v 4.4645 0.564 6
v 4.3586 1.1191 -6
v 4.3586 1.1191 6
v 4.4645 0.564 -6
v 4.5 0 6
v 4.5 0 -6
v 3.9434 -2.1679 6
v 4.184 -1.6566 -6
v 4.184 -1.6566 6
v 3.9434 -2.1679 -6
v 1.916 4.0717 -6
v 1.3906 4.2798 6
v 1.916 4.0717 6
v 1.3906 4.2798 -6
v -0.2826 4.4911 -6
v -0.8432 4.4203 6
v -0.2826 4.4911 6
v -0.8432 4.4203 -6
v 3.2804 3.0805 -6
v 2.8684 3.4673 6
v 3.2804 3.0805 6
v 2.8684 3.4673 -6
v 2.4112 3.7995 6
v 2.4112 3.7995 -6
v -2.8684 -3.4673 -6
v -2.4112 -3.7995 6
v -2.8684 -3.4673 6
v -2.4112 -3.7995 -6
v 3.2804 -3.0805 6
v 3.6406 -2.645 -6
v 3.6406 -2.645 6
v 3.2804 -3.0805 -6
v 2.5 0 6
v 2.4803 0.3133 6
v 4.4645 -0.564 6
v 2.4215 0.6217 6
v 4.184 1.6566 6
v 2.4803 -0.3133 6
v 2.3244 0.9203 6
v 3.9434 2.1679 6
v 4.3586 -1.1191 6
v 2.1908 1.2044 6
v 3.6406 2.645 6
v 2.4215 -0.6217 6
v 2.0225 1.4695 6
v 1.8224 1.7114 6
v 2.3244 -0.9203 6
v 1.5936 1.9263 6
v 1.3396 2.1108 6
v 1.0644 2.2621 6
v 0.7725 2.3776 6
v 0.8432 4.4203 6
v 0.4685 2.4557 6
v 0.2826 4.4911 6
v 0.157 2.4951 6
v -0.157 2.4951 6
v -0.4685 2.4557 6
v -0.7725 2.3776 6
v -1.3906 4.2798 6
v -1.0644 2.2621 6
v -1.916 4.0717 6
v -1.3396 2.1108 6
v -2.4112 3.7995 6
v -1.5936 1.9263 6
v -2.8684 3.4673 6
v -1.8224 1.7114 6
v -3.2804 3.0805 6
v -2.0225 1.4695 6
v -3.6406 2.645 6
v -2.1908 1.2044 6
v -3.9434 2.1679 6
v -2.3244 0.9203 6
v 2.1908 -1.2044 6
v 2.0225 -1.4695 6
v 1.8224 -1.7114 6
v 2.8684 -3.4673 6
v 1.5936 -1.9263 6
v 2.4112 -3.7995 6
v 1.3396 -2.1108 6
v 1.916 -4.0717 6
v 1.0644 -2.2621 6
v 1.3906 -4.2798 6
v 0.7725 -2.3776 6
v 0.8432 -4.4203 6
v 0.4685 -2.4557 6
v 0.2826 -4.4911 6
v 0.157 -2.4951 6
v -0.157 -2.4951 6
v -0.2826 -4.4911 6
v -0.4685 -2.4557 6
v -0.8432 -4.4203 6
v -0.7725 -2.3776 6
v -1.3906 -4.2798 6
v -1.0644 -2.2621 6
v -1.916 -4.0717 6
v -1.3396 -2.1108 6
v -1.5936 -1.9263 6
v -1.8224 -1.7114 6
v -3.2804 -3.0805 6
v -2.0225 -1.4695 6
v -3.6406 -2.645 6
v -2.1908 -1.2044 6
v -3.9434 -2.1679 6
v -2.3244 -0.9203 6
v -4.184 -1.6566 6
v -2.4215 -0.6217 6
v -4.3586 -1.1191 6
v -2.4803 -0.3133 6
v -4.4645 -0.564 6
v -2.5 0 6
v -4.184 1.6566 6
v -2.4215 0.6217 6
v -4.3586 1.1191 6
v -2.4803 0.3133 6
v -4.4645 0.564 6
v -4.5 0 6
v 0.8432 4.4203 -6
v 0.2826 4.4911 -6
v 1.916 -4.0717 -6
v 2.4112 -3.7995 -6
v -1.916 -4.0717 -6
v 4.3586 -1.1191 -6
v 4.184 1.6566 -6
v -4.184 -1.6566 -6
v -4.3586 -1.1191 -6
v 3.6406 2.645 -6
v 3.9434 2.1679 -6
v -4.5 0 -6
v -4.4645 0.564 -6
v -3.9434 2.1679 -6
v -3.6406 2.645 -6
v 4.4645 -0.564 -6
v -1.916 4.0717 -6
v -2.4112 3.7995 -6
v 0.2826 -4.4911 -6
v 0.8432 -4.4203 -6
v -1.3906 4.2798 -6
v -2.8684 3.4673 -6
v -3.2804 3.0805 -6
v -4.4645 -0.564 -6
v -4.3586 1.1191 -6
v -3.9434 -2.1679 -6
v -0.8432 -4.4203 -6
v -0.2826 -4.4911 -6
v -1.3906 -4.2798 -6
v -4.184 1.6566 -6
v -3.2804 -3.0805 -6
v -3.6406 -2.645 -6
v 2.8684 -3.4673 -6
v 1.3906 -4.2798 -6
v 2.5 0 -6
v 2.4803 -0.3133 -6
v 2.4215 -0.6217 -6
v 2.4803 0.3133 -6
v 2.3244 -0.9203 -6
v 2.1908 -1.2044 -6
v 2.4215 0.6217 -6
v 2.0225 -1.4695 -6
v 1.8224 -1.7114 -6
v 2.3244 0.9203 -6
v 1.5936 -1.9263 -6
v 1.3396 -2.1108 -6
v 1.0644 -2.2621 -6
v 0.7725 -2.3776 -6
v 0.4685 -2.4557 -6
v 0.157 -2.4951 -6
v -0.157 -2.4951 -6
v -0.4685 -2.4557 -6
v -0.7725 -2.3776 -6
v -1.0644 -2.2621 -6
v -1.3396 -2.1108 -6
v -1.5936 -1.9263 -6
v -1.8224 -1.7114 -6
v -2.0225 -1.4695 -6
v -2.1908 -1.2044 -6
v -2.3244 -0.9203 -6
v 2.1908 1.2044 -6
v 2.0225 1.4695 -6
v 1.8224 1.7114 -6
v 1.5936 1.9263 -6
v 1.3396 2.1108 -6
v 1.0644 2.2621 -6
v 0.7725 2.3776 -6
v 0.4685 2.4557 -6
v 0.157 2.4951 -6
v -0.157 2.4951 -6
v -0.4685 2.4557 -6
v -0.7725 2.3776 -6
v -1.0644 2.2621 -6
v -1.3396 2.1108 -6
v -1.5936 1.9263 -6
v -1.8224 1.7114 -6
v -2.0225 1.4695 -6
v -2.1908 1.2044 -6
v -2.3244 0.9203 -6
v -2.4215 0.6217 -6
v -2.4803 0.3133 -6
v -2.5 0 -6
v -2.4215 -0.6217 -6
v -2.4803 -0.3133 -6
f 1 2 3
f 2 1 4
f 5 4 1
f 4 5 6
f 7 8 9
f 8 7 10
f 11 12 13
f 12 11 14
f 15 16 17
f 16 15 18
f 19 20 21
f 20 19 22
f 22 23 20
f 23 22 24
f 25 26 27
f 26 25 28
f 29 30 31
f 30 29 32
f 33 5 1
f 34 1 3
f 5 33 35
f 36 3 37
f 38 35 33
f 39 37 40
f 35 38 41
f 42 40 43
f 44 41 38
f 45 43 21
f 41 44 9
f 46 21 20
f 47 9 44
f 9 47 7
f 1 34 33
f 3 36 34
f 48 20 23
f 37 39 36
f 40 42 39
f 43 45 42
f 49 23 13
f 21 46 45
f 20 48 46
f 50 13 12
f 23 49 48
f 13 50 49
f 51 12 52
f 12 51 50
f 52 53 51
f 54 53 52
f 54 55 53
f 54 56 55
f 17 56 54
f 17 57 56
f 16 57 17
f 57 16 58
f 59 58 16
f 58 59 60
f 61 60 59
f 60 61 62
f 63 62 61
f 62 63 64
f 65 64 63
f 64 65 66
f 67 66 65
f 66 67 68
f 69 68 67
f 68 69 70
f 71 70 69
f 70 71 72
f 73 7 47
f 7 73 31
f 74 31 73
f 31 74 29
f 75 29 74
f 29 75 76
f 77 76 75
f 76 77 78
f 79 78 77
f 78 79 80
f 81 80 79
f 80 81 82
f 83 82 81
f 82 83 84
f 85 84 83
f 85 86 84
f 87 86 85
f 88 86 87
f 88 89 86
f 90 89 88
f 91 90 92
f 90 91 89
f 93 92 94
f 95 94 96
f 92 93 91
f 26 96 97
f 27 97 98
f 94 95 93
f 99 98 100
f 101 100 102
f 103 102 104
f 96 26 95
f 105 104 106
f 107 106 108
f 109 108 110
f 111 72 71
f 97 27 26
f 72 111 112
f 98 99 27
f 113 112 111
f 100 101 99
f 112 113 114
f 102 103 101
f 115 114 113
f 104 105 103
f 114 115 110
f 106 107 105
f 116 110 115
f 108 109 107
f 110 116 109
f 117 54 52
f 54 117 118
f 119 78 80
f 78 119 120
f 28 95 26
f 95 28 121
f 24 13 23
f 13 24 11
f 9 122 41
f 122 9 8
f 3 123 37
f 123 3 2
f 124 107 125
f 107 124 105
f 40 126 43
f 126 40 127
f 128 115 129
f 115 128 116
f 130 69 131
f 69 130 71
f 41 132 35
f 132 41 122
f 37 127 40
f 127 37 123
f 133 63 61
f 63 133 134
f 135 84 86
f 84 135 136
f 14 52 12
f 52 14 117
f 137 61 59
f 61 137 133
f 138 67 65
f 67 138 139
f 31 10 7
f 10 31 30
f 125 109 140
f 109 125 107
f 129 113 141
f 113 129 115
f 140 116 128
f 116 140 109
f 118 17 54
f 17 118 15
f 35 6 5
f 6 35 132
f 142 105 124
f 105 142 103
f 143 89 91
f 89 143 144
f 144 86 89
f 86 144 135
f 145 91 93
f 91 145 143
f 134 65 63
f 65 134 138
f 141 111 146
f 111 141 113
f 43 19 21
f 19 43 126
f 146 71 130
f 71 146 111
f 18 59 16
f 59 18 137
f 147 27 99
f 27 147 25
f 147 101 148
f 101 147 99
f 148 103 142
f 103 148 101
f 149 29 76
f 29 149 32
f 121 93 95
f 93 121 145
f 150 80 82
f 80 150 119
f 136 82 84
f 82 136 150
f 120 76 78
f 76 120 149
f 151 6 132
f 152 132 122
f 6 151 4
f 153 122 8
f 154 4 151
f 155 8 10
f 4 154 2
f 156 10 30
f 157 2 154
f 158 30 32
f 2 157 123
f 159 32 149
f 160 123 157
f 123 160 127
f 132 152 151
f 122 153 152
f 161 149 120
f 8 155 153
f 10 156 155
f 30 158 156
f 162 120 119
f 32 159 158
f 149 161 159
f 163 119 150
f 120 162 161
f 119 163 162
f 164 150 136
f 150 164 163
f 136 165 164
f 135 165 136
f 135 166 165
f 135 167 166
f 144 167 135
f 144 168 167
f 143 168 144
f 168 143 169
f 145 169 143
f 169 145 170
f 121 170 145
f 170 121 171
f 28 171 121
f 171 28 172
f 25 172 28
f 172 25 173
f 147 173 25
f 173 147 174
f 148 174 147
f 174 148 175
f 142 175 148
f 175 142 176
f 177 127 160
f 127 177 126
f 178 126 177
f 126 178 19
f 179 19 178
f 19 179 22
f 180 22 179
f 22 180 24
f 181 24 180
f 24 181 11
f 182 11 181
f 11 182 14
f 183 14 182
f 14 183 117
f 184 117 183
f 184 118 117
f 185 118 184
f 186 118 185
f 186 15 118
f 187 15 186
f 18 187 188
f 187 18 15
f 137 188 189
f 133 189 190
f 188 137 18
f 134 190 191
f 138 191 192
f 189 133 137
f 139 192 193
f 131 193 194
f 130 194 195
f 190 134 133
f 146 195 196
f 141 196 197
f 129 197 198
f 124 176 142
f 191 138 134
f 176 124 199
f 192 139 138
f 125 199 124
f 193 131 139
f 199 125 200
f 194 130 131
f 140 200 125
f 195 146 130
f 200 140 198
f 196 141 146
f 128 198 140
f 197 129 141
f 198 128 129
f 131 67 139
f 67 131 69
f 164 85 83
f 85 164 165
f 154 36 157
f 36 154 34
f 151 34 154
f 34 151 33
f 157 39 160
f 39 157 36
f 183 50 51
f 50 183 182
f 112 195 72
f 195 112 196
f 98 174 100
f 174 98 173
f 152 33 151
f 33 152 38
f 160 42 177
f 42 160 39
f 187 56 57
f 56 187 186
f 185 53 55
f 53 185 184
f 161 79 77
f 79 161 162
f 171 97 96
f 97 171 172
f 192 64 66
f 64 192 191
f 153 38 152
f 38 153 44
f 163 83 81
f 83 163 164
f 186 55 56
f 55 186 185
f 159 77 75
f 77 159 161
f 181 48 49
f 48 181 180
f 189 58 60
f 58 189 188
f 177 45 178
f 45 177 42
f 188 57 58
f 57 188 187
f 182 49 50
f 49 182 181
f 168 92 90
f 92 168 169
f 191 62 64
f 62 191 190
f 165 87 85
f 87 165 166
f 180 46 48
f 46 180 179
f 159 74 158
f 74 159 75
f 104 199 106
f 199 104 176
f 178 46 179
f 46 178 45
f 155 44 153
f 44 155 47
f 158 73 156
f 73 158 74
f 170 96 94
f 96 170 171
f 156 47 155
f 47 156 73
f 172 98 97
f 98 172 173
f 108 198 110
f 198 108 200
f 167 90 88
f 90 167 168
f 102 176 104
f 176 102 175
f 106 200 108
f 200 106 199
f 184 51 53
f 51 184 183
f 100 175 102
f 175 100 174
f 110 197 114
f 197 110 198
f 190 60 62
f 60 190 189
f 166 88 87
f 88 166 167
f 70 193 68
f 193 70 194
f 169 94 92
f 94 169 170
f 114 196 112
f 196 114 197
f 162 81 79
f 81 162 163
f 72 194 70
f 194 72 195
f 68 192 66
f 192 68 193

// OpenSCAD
$fn = 50;


difference() {
	union() {
		translate(v = [0, 0, -6.0000000000]) {
			cylinder(h = 12, r = 4.5000000000);
		}
	}
	union() {
		translate(v = [0, 0, -100.0000000000]) {
			cylinder(h = 200, r = 2.5000000000);
		}
	}
}
